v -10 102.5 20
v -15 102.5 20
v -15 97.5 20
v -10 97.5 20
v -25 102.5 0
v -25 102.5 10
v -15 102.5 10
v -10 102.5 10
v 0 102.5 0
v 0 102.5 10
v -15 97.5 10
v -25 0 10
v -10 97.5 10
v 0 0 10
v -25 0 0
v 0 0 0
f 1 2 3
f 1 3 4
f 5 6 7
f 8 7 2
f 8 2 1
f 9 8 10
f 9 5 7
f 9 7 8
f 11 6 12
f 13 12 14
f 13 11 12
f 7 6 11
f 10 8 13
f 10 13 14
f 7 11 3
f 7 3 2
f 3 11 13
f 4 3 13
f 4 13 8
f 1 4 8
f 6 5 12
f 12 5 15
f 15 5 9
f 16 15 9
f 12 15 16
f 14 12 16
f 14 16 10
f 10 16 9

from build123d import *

# Parameters (mm, degrees)
BOSS_EXTRUDE1_DEPTH = 10
SKETCH1_3_W         = 5
SKETCH1_3_H         = 5
BOSS_EXTRUDE2_DEPTH = 20


with BuildPart() as part:
    # Sketch1 → Boss-Extrude1 (new body)
    with BuildSketch(Plane.XY):
        Polygon((-25, 0), (0, 0), (0, 102.5), (-10, 102.5), (-10, 97.5), (-15, 97.5), (-15, 102.5), (-25, 102.5), align=None)
    extrude(amount=BOSS_EXTRUDE1_DEPTH)

    # Sketch1<3> → Boss-Extrude2 (add)
    with BuildSketch(Plane.XY):
        with Locations((-12.5, 100)):
            Rectangle(SKETCH1_3_W, SKETCH1_3_H)
    extrude(amount=BOSS_EXTRUDE2_DEPTH)


solid = part.part
